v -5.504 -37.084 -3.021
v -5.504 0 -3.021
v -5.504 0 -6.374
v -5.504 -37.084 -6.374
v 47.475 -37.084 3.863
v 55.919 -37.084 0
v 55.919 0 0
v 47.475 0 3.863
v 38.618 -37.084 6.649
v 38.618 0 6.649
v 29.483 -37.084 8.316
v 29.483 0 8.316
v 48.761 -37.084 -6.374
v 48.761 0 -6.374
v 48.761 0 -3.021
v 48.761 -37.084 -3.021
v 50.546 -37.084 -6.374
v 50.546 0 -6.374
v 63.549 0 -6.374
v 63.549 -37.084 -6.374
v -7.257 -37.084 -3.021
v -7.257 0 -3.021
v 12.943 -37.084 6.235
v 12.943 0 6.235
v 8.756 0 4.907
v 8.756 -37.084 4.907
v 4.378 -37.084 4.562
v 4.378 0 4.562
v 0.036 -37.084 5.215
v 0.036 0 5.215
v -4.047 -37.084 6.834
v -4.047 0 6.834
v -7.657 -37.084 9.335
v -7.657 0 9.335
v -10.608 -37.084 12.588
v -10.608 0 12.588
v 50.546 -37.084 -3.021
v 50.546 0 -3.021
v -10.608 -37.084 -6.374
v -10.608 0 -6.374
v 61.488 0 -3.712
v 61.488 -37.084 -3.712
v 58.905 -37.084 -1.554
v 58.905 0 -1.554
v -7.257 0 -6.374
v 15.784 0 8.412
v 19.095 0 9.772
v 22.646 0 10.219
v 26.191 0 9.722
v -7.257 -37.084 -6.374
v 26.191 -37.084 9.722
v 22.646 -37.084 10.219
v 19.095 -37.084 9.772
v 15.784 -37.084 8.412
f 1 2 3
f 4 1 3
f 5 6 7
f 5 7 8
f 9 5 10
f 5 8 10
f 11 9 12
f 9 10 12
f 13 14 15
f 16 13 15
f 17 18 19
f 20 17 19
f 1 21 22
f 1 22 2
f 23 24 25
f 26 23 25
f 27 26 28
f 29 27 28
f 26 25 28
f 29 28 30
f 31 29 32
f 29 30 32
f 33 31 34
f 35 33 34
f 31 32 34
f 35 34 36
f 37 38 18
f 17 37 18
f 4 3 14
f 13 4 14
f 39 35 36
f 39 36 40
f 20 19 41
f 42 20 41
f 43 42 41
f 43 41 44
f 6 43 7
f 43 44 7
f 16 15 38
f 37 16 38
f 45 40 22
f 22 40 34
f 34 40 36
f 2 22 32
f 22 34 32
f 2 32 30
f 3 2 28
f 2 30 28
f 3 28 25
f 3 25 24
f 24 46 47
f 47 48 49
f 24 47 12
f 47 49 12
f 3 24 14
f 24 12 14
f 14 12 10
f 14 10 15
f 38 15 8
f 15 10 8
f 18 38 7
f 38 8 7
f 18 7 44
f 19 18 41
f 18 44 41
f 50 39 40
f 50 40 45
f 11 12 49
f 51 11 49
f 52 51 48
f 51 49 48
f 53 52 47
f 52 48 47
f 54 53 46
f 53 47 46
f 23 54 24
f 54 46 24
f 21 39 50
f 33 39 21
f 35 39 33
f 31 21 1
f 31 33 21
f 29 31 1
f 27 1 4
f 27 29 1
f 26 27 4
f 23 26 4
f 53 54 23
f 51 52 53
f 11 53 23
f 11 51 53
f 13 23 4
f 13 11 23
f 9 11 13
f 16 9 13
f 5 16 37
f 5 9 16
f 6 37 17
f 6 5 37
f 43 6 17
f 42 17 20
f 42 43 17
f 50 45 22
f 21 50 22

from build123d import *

# Parameters (mm, degrees)
F1_DEPTH = 37.084


with BuildPart() as f1:
    # F0 (on Front) → F1 (new body)
    with BuildSketch(Plane.XZ):
        with BuildLine():
            ThreePointArc((12.942736, 6.234619), (0.035532, 5.21526), (-10.607814, 12.58779))
            Line((-10.607814, 12.58779), (-10.607814, -6.373834))
            Line((-10.607814, -6.373834), (-7.256928, -6.373834))
            Line((-7.256928, -6.373834), (-7.256928, -3.021034))
            Line((-7.256928, -3.021034), (-5.504328, -3.021034))
            Line((-5.504328, -3.021034), (-5.504328, -6.373834))
            Line((-5.504328, -6.373834), (48.761478, -6.373834))
            Line((48.761478, -6.373834), (48.761478, -3.021034))
            Line((48.761478, -3.021034), (50.546074, -3.021034))
            Line((50.546074, -3.021034), (50.546074, -6.373834))
            Line((50.546074, -6.373834), (60.481984, -6.373834))
            Line((60.481984, -6.373834), (63.549221, -6.373834))
            ThreePointArc((63.549221, -6.373834), (60.255035, -2.563114), (55.918712, 0))
            ThreePointArc((55.918712, 0), (43.08963, 5.393993), (29.482889, 8.31583))
            ThreePointArc((29.482889, 8.31583), (20.855773, 10.112752), (12.942736, 6.234619))
        make_face()
    extrude(amount=F1_DEPTH)


solid = f1.part
